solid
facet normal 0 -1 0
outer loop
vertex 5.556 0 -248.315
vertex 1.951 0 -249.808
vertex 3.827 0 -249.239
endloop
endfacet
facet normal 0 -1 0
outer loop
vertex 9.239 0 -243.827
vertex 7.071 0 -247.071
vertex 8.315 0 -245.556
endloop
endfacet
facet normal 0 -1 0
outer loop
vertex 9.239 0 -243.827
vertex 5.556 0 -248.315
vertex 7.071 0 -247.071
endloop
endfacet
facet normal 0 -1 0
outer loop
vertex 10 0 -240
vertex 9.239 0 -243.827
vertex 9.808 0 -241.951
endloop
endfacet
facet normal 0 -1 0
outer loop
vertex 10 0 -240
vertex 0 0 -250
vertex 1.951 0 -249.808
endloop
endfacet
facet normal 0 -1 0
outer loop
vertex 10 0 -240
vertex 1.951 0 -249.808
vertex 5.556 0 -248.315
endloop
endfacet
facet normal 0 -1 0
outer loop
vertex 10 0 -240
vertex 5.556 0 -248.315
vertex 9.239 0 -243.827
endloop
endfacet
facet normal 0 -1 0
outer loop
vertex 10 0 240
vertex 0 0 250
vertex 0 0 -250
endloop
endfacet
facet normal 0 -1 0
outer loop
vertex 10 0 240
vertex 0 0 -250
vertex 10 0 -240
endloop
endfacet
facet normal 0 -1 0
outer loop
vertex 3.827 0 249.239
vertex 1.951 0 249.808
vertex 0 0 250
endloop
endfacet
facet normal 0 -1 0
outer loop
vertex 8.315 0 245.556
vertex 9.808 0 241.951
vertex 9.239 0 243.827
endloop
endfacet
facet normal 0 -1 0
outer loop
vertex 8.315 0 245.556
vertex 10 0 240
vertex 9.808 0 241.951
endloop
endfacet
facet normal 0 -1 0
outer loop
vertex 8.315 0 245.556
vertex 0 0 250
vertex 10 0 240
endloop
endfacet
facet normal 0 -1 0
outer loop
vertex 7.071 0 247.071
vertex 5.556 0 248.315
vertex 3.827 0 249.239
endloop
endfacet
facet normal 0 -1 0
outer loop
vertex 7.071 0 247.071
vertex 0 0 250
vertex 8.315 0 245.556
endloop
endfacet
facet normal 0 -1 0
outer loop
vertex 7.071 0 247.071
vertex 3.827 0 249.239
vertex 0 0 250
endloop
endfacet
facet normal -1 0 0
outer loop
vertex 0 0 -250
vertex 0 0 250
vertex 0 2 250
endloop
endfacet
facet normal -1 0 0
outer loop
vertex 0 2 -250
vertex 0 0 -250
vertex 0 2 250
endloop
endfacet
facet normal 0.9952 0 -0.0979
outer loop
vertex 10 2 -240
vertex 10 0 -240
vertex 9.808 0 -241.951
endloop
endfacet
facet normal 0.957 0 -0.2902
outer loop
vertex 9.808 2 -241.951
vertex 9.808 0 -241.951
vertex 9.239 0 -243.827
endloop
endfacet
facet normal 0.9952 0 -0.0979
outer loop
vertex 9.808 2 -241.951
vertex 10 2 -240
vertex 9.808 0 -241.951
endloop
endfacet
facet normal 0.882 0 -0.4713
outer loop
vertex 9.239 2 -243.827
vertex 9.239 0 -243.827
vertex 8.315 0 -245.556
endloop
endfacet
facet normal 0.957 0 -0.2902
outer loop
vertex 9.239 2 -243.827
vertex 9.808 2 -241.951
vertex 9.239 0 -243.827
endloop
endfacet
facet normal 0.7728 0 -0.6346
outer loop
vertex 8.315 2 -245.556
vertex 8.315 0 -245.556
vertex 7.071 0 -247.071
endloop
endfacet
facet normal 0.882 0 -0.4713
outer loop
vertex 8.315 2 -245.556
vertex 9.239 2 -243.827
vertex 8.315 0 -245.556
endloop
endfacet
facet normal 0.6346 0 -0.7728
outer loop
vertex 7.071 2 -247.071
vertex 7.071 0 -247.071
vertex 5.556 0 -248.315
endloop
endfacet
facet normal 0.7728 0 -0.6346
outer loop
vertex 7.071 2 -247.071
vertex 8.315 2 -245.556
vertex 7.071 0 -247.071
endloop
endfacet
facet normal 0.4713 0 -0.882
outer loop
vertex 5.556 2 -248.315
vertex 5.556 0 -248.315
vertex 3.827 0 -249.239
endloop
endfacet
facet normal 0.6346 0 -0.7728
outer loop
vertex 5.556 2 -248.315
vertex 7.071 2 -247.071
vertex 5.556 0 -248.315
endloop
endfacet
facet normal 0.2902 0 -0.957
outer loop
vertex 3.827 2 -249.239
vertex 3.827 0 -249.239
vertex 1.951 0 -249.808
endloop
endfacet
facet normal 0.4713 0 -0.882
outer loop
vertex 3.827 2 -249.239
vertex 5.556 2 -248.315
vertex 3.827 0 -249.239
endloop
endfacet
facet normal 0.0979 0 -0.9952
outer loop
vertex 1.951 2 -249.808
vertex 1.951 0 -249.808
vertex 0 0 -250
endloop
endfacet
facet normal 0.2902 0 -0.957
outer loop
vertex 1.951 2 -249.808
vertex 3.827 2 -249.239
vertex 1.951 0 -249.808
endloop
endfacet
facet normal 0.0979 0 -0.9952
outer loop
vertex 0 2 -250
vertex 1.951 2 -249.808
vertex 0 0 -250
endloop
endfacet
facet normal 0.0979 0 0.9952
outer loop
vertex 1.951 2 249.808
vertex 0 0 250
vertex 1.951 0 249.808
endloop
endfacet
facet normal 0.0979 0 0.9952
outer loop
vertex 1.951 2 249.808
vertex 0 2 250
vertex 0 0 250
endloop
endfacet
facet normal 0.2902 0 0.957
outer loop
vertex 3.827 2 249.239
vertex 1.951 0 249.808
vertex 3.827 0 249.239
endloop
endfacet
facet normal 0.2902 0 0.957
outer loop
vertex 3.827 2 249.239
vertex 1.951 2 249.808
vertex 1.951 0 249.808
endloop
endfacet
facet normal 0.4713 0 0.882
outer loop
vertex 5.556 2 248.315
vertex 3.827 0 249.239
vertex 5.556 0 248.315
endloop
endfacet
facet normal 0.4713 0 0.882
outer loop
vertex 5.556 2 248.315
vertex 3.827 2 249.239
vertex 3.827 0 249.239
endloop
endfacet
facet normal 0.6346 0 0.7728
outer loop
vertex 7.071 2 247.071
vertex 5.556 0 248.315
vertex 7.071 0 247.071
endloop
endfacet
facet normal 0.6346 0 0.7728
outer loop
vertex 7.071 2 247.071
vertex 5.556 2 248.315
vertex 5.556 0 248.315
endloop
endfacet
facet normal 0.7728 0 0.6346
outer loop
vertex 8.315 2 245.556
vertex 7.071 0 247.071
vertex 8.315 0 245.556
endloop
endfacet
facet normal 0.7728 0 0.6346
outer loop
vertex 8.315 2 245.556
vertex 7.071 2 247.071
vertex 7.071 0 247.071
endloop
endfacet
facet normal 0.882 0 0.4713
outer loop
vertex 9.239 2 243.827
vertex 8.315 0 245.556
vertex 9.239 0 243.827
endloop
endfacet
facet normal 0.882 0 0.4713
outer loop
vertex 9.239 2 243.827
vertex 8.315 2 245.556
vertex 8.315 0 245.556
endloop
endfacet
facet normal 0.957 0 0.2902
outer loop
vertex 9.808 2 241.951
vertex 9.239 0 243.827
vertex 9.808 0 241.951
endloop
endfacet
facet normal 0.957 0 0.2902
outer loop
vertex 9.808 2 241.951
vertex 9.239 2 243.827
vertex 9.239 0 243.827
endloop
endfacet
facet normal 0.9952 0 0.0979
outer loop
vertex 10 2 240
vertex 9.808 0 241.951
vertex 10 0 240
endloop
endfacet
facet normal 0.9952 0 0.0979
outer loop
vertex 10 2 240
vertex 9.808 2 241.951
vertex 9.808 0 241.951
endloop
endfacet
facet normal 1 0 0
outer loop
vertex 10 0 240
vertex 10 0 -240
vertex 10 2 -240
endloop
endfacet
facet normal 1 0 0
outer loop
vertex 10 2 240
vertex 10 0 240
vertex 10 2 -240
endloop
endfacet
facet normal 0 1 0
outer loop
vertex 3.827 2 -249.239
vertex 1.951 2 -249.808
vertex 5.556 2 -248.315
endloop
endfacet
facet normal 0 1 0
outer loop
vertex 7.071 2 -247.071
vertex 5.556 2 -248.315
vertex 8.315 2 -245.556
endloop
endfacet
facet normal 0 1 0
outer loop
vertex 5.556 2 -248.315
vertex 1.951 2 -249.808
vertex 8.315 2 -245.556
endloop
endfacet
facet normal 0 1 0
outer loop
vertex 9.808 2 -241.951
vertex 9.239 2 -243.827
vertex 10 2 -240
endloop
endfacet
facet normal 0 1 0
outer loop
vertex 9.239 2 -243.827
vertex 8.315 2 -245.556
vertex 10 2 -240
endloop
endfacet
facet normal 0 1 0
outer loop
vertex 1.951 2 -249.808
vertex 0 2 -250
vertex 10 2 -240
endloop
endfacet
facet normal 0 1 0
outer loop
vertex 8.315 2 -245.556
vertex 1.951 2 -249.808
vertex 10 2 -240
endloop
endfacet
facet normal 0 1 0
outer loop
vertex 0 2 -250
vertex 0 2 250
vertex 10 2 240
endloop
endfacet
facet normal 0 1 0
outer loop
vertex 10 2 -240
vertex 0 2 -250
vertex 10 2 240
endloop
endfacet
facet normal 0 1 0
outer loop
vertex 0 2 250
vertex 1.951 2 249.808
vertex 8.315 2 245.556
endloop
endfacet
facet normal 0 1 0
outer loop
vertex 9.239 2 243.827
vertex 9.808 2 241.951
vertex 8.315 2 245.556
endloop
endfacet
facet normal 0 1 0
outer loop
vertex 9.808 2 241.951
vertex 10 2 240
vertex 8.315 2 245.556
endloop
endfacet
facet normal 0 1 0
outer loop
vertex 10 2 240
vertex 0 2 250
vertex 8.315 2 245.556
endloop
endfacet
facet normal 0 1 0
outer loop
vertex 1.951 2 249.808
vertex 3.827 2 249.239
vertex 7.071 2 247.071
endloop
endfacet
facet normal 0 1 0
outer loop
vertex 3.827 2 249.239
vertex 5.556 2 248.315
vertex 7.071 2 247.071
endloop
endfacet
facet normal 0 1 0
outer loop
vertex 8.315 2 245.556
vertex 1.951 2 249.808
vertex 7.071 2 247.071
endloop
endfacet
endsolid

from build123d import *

# Parameters (mm, degrees)
SKETCH_1_W      = 10
SKETCH_1_H      = 2
EXTRUDE_1_DEPTH = 250
FILLET_1_R      = 10


with BuildPart() as part:
    # 草图1 → 凸台-拉伸1 (new, symmetric)
    with BuildSketch(Plane.XY):
        with Locations((5, 1)):
            Rectangle(SKETCH_1_W, SKETCH_1_H)
    extrude(amount=EXTRUDE_1_DEPTH, both=True)

    # 圆角1
    fillet_1_edges = [part.edges().sort_by_distance(p)[0] for p in [
        (10, 1, -250),
        (10, 1, 250),
    ]]
    fillet(fillet_1_edges, radius=FILLET_1_R - 0.0001)  # a hair under: the kernel refuses the full size


solid = part.part
